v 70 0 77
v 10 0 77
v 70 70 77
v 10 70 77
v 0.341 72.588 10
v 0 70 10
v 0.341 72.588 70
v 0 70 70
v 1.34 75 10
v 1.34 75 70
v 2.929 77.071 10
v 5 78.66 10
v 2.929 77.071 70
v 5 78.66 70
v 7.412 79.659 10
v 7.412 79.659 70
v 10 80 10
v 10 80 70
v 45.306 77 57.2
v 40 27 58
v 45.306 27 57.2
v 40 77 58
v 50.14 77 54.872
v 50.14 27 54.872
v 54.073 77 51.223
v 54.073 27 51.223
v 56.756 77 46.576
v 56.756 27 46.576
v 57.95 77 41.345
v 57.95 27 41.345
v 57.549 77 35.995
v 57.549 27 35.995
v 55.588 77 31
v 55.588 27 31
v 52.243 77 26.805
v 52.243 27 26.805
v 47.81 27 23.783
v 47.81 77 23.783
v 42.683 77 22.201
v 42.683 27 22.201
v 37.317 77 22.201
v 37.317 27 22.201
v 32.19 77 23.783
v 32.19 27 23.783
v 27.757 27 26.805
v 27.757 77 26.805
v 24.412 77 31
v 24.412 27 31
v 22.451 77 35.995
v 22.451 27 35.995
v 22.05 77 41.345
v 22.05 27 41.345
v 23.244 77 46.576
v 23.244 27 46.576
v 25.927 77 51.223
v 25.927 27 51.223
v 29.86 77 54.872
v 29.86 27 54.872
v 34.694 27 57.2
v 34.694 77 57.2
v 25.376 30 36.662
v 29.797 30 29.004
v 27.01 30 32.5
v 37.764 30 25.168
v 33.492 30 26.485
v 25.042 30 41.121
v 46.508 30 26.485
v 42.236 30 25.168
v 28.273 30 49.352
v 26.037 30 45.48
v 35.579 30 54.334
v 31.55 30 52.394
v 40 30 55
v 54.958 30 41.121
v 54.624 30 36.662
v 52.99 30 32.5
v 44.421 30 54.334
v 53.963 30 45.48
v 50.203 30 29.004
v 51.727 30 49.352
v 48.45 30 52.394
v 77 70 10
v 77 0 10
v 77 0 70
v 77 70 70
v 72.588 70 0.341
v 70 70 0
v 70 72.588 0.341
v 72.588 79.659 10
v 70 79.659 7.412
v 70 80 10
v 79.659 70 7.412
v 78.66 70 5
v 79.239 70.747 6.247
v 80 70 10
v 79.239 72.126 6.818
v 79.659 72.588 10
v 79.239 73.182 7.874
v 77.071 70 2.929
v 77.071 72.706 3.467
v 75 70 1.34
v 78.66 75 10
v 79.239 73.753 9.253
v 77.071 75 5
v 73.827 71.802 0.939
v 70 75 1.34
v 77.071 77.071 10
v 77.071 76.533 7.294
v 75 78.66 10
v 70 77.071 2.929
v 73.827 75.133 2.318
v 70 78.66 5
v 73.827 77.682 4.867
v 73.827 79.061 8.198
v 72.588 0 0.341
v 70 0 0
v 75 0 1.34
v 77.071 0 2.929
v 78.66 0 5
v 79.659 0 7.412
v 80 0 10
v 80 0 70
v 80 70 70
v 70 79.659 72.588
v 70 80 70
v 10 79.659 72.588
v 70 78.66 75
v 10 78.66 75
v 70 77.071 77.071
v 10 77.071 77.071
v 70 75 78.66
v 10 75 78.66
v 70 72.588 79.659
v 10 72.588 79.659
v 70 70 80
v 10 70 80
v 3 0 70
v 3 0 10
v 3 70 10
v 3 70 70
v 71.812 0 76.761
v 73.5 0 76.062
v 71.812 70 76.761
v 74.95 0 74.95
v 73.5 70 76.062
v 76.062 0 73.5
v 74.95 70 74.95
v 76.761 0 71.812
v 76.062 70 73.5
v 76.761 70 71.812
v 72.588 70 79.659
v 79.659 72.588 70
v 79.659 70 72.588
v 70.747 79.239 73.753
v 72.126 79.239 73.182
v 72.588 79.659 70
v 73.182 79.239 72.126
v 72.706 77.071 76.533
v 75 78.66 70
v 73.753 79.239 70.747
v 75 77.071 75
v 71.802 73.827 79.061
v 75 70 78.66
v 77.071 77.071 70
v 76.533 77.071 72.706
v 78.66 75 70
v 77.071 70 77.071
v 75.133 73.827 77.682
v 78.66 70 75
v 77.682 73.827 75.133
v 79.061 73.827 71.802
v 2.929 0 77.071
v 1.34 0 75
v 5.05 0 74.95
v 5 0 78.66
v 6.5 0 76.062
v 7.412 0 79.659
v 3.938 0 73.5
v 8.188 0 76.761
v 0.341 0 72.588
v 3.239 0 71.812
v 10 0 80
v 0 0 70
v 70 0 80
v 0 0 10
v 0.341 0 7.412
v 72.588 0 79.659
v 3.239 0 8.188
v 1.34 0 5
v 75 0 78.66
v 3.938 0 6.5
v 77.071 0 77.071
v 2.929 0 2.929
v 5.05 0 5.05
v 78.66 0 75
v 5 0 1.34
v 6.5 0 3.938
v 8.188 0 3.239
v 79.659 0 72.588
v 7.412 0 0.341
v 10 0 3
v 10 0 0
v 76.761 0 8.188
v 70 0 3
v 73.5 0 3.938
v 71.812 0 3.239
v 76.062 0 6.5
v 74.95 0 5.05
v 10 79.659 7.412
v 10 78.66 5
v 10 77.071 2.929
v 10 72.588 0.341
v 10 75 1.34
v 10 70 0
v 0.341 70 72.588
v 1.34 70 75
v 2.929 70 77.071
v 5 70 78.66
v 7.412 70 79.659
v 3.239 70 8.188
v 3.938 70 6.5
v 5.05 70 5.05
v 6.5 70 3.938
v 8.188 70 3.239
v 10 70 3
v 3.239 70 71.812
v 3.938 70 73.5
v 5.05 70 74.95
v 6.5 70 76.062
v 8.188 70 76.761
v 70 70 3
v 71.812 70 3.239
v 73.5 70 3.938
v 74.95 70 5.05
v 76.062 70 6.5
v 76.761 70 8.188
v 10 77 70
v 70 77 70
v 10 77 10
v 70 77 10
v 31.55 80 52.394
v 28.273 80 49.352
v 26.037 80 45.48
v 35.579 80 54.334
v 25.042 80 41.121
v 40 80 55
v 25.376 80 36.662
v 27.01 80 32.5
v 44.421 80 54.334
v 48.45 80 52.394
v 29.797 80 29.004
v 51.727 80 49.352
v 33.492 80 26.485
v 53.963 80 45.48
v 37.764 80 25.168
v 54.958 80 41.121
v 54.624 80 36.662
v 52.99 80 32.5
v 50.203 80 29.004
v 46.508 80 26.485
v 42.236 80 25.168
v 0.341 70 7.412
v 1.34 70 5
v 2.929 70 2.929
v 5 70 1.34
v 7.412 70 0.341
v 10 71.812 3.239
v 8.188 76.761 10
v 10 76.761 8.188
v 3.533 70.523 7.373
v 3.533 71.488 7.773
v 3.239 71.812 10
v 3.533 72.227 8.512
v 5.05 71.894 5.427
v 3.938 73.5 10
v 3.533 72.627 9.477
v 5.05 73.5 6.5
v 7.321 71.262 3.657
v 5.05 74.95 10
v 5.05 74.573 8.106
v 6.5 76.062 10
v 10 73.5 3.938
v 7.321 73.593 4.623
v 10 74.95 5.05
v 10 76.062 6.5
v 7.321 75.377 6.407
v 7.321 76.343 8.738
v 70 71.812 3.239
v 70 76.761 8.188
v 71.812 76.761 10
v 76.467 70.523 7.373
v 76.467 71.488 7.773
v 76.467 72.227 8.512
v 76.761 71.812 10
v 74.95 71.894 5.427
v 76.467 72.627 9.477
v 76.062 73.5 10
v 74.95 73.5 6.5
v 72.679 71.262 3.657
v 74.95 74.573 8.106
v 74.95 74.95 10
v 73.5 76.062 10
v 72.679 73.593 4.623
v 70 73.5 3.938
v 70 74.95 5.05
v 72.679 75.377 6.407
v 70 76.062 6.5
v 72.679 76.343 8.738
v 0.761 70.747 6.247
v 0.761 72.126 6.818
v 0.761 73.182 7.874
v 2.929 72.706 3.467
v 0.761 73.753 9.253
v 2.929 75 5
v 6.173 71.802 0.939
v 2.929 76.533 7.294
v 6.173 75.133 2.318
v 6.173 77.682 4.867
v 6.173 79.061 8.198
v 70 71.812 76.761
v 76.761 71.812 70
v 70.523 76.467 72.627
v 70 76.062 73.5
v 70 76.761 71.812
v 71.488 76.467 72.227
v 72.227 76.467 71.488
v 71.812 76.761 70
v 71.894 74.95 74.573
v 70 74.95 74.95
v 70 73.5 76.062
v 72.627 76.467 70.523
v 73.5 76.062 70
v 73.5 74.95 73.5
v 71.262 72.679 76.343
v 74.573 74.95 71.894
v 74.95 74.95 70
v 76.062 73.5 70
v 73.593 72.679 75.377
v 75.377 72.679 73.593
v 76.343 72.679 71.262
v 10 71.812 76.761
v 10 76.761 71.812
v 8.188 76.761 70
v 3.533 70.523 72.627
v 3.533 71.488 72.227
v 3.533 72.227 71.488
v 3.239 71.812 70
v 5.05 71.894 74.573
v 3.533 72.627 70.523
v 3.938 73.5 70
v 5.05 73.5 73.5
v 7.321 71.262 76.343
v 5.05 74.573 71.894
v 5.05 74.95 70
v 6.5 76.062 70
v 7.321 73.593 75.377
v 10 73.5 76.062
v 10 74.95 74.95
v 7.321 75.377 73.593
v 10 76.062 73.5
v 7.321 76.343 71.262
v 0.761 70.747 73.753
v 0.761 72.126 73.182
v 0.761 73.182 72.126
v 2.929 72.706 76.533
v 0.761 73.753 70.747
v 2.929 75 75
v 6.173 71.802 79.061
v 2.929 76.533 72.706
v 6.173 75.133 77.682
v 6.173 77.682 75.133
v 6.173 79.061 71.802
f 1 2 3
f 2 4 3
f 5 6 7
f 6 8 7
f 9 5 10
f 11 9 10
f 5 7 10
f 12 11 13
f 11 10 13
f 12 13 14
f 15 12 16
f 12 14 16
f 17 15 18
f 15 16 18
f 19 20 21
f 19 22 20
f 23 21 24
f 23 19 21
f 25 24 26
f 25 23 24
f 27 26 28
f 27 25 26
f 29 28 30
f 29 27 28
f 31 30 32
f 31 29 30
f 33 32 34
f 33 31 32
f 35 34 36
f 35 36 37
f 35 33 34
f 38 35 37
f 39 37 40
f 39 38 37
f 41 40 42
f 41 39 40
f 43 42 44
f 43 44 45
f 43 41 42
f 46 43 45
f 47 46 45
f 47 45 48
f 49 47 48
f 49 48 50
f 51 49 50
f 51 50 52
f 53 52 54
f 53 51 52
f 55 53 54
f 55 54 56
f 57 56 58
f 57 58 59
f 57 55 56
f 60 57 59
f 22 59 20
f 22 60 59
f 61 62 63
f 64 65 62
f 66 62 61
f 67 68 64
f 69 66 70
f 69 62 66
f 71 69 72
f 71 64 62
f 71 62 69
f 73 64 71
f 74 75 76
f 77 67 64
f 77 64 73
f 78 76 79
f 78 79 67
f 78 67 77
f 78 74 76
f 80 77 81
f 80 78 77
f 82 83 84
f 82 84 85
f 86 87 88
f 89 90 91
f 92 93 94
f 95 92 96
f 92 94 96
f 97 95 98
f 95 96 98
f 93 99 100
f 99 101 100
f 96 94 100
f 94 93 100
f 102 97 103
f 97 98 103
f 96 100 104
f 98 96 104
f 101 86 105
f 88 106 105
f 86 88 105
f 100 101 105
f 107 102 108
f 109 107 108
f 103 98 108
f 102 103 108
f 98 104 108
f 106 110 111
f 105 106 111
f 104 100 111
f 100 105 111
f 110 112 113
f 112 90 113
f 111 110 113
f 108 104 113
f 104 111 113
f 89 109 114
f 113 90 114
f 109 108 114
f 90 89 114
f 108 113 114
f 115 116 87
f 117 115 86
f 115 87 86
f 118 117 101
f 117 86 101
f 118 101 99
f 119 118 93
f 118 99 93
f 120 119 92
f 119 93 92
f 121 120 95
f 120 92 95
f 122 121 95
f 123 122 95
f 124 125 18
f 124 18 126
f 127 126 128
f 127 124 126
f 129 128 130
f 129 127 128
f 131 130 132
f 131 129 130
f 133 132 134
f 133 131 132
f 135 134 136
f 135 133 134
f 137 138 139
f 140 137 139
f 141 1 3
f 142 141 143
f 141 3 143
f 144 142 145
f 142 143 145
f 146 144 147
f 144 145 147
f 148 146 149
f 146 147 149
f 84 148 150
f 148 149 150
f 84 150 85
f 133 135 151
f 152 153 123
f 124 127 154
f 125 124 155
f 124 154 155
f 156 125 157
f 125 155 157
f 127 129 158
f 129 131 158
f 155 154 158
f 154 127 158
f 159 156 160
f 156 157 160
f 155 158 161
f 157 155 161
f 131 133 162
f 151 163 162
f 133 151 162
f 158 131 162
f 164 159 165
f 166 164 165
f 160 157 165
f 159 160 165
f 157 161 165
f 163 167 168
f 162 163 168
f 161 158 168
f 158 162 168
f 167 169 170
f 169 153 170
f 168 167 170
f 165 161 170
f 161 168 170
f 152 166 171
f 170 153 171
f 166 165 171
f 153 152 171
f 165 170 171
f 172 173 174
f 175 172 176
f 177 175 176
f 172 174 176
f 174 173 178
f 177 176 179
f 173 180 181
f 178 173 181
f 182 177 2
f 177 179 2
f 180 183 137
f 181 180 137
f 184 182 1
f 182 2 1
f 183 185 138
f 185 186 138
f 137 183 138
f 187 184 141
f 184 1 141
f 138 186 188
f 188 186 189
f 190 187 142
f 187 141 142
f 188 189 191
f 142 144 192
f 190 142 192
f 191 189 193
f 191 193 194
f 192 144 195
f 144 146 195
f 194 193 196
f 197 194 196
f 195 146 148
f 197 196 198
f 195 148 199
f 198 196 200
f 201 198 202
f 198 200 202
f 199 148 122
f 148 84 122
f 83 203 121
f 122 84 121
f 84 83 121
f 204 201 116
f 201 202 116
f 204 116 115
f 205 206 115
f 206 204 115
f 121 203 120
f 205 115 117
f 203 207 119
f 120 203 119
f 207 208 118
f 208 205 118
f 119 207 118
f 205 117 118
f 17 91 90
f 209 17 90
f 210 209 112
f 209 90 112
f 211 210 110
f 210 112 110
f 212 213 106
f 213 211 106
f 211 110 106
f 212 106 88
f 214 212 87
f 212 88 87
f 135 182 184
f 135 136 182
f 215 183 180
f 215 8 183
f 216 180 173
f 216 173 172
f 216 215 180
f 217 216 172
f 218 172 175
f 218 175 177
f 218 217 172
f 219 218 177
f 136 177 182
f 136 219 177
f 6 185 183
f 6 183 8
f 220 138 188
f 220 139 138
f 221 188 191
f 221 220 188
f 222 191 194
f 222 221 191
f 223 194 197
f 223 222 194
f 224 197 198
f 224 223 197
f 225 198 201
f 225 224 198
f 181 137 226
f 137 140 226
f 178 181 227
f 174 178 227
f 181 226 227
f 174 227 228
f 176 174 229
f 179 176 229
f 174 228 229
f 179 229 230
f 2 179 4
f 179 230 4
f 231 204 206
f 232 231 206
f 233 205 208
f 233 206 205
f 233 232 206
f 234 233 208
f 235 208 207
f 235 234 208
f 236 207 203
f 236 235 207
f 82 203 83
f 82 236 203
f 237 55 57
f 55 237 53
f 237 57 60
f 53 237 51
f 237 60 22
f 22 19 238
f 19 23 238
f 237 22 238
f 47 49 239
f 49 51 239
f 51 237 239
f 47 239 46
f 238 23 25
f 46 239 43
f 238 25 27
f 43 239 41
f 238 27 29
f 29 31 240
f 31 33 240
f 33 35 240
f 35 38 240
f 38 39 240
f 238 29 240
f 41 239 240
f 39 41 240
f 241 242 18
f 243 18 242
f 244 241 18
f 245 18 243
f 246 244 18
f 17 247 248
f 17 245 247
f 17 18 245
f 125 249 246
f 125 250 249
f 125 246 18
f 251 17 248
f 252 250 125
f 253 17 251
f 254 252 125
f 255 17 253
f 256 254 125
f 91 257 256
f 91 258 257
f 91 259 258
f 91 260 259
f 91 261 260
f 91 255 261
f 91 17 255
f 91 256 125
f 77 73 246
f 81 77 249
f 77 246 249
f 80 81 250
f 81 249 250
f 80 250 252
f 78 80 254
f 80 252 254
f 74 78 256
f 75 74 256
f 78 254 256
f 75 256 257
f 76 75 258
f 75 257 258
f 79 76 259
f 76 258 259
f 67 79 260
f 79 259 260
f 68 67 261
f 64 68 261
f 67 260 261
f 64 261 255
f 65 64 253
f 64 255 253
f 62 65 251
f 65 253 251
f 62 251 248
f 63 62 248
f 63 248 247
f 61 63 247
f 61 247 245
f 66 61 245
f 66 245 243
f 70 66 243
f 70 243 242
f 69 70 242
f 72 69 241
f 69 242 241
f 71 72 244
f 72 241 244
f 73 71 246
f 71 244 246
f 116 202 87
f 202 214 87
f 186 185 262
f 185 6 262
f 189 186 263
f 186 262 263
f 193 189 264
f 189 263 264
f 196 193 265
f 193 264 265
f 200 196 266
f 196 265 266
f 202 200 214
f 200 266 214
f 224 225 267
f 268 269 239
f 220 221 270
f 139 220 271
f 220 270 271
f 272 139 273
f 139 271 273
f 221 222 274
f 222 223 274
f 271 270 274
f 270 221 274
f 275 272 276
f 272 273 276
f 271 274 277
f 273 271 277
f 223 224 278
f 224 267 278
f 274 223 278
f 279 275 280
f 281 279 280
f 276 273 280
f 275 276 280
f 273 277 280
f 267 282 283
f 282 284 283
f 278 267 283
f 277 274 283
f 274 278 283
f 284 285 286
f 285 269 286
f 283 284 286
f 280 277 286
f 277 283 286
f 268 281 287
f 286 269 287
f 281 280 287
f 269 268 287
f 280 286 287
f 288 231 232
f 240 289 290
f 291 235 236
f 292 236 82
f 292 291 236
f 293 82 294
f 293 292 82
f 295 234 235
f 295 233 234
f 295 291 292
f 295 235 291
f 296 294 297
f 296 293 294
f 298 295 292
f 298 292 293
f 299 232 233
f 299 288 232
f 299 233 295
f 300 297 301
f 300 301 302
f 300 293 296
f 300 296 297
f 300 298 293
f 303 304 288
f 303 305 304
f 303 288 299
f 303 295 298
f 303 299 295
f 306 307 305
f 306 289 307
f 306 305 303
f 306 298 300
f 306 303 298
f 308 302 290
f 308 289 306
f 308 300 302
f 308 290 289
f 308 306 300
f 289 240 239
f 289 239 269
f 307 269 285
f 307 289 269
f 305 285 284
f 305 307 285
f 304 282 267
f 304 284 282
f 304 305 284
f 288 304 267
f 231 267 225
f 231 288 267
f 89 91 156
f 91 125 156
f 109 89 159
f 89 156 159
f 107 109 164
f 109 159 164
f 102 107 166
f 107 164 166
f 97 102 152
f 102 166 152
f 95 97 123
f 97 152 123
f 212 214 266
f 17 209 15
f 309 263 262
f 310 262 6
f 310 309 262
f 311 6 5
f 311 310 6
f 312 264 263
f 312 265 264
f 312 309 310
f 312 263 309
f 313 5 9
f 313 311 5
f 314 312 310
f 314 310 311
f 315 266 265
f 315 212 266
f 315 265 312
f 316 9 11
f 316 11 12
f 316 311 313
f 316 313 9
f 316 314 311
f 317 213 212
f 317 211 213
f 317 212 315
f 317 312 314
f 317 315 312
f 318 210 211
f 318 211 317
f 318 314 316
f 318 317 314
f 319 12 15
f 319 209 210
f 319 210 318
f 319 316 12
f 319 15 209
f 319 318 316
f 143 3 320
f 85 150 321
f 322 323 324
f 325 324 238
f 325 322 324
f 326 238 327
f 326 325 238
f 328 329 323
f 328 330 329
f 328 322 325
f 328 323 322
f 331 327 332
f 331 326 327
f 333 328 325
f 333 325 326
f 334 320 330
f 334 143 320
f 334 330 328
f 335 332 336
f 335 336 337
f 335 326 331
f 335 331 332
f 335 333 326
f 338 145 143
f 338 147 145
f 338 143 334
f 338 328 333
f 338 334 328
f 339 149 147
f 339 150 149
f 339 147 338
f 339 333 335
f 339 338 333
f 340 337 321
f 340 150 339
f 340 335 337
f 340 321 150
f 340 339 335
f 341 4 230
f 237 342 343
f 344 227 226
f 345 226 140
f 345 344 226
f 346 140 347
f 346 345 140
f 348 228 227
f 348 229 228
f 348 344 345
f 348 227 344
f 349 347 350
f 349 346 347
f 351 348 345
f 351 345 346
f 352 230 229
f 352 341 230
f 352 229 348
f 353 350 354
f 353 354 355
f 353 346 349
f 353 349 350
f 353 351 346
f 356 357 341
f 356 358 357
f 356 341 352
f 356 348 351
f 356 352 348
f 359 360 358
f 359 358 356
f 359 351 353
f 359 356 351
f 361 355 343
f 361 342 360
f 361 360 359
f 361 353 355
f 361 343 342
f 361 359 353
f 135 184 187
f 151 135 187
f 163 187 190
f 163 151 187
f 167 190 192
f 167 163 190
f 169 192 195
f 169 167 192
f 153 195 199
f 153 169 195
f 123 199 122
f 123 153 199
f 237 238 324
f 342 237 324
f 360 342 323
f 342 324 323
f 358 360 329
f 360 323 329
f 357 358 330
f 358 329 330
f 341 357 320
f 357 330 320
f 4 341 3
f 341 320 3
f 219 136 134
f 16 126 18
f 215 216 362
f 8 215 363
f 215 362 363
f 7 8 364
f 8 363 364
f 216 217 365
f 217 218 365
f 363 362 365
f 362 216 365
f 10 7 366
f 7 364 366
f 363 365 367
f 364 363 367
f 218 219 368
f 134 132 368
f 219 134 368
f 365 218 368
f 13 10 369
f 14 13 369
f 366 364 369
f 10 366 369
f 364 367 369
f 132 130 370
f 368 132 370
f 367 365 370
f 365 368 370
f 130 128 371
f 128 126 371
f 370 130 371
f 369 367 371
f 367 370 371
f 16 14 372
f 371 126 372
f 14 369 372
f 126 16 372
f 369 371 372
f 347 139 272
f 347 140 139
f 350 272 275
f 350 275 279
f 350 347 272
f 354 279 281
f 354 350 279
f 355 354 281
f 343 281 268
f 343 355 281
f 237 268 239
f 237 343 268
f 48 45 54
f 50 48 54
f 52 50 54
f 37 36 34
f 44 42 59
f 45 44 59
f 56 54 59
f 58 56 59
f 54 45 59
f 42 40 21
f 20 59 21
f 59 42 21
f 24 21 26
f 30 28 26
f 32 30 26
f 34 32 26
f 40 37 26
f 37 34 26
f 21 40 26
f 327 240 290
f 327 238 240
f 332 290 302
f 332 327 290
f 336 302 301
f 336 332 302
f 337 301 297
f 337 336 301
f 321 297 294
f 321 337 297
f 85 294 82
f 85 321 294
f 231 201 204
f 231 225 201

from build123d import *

# Parameters (mm, degrees)
IZIM1_W                     = 80
IZIM1_H                     = 80
Y_KSEKLIK_EKSTR_ZYON1_DEPTH = 80
IZIM2_R                     = 15
KES_EKSTR_ZYON1_DEPTH       = 50
RADYUS1_R                   = 10
BO_ALTMA1_T                 = -3


with BuildPart() as part:
    # Çizim1 → Yükseklik-Ekstrüzyon1 (new body)
    with BuildSketch(Plane.XY):
        with Locations((40, 40)):
            Rectangle(IZIM1_W, IZIM1_H)
    extrude(amount=Y_KSEKLIK_EKSTR_ZYON1_DEPTH)

    # Çizim2 → Kes-Ekstrüzyon1 (cut)
    with BuildSketch(Plane(origin=(0, 80, 0), x_dir=(1, 0, 0), z_dir=(0, 1, 0))):
        with Locations(Location((40, -40, 0), (0, 0, 270))):
            Circle(IZIM2_R)
    extrude(amount=-KES_EKSTR_ZYON1_DEPTH, mode=Mode.SUBTRACT)

    # Radyus1
    radyus1_edges = [part.edges().sort_by_distance(p)[0] for p in [
        (80, 40, 80),
        (40, 80, 80),
        (0, 40, 80),
        (40, 80, 0),
        (80, 40, 0),
        (0, 40, 0),
        (0, 80, 40),
        (80, 80, 40),
    ]]
    fillet(radyus1_edges, radius=RADYUS1_R)

    # İç Boşaltma1
    bo_altma1_openings = [part.faces().sort_by_distance(p)[0] for p in [
        (40, 0, 40),
    ]]
    offset(amount=BO_ALTMA1_T, openings=bo_altma1_openings, kind=Kind.INTERSECTION)


solid = part.part
